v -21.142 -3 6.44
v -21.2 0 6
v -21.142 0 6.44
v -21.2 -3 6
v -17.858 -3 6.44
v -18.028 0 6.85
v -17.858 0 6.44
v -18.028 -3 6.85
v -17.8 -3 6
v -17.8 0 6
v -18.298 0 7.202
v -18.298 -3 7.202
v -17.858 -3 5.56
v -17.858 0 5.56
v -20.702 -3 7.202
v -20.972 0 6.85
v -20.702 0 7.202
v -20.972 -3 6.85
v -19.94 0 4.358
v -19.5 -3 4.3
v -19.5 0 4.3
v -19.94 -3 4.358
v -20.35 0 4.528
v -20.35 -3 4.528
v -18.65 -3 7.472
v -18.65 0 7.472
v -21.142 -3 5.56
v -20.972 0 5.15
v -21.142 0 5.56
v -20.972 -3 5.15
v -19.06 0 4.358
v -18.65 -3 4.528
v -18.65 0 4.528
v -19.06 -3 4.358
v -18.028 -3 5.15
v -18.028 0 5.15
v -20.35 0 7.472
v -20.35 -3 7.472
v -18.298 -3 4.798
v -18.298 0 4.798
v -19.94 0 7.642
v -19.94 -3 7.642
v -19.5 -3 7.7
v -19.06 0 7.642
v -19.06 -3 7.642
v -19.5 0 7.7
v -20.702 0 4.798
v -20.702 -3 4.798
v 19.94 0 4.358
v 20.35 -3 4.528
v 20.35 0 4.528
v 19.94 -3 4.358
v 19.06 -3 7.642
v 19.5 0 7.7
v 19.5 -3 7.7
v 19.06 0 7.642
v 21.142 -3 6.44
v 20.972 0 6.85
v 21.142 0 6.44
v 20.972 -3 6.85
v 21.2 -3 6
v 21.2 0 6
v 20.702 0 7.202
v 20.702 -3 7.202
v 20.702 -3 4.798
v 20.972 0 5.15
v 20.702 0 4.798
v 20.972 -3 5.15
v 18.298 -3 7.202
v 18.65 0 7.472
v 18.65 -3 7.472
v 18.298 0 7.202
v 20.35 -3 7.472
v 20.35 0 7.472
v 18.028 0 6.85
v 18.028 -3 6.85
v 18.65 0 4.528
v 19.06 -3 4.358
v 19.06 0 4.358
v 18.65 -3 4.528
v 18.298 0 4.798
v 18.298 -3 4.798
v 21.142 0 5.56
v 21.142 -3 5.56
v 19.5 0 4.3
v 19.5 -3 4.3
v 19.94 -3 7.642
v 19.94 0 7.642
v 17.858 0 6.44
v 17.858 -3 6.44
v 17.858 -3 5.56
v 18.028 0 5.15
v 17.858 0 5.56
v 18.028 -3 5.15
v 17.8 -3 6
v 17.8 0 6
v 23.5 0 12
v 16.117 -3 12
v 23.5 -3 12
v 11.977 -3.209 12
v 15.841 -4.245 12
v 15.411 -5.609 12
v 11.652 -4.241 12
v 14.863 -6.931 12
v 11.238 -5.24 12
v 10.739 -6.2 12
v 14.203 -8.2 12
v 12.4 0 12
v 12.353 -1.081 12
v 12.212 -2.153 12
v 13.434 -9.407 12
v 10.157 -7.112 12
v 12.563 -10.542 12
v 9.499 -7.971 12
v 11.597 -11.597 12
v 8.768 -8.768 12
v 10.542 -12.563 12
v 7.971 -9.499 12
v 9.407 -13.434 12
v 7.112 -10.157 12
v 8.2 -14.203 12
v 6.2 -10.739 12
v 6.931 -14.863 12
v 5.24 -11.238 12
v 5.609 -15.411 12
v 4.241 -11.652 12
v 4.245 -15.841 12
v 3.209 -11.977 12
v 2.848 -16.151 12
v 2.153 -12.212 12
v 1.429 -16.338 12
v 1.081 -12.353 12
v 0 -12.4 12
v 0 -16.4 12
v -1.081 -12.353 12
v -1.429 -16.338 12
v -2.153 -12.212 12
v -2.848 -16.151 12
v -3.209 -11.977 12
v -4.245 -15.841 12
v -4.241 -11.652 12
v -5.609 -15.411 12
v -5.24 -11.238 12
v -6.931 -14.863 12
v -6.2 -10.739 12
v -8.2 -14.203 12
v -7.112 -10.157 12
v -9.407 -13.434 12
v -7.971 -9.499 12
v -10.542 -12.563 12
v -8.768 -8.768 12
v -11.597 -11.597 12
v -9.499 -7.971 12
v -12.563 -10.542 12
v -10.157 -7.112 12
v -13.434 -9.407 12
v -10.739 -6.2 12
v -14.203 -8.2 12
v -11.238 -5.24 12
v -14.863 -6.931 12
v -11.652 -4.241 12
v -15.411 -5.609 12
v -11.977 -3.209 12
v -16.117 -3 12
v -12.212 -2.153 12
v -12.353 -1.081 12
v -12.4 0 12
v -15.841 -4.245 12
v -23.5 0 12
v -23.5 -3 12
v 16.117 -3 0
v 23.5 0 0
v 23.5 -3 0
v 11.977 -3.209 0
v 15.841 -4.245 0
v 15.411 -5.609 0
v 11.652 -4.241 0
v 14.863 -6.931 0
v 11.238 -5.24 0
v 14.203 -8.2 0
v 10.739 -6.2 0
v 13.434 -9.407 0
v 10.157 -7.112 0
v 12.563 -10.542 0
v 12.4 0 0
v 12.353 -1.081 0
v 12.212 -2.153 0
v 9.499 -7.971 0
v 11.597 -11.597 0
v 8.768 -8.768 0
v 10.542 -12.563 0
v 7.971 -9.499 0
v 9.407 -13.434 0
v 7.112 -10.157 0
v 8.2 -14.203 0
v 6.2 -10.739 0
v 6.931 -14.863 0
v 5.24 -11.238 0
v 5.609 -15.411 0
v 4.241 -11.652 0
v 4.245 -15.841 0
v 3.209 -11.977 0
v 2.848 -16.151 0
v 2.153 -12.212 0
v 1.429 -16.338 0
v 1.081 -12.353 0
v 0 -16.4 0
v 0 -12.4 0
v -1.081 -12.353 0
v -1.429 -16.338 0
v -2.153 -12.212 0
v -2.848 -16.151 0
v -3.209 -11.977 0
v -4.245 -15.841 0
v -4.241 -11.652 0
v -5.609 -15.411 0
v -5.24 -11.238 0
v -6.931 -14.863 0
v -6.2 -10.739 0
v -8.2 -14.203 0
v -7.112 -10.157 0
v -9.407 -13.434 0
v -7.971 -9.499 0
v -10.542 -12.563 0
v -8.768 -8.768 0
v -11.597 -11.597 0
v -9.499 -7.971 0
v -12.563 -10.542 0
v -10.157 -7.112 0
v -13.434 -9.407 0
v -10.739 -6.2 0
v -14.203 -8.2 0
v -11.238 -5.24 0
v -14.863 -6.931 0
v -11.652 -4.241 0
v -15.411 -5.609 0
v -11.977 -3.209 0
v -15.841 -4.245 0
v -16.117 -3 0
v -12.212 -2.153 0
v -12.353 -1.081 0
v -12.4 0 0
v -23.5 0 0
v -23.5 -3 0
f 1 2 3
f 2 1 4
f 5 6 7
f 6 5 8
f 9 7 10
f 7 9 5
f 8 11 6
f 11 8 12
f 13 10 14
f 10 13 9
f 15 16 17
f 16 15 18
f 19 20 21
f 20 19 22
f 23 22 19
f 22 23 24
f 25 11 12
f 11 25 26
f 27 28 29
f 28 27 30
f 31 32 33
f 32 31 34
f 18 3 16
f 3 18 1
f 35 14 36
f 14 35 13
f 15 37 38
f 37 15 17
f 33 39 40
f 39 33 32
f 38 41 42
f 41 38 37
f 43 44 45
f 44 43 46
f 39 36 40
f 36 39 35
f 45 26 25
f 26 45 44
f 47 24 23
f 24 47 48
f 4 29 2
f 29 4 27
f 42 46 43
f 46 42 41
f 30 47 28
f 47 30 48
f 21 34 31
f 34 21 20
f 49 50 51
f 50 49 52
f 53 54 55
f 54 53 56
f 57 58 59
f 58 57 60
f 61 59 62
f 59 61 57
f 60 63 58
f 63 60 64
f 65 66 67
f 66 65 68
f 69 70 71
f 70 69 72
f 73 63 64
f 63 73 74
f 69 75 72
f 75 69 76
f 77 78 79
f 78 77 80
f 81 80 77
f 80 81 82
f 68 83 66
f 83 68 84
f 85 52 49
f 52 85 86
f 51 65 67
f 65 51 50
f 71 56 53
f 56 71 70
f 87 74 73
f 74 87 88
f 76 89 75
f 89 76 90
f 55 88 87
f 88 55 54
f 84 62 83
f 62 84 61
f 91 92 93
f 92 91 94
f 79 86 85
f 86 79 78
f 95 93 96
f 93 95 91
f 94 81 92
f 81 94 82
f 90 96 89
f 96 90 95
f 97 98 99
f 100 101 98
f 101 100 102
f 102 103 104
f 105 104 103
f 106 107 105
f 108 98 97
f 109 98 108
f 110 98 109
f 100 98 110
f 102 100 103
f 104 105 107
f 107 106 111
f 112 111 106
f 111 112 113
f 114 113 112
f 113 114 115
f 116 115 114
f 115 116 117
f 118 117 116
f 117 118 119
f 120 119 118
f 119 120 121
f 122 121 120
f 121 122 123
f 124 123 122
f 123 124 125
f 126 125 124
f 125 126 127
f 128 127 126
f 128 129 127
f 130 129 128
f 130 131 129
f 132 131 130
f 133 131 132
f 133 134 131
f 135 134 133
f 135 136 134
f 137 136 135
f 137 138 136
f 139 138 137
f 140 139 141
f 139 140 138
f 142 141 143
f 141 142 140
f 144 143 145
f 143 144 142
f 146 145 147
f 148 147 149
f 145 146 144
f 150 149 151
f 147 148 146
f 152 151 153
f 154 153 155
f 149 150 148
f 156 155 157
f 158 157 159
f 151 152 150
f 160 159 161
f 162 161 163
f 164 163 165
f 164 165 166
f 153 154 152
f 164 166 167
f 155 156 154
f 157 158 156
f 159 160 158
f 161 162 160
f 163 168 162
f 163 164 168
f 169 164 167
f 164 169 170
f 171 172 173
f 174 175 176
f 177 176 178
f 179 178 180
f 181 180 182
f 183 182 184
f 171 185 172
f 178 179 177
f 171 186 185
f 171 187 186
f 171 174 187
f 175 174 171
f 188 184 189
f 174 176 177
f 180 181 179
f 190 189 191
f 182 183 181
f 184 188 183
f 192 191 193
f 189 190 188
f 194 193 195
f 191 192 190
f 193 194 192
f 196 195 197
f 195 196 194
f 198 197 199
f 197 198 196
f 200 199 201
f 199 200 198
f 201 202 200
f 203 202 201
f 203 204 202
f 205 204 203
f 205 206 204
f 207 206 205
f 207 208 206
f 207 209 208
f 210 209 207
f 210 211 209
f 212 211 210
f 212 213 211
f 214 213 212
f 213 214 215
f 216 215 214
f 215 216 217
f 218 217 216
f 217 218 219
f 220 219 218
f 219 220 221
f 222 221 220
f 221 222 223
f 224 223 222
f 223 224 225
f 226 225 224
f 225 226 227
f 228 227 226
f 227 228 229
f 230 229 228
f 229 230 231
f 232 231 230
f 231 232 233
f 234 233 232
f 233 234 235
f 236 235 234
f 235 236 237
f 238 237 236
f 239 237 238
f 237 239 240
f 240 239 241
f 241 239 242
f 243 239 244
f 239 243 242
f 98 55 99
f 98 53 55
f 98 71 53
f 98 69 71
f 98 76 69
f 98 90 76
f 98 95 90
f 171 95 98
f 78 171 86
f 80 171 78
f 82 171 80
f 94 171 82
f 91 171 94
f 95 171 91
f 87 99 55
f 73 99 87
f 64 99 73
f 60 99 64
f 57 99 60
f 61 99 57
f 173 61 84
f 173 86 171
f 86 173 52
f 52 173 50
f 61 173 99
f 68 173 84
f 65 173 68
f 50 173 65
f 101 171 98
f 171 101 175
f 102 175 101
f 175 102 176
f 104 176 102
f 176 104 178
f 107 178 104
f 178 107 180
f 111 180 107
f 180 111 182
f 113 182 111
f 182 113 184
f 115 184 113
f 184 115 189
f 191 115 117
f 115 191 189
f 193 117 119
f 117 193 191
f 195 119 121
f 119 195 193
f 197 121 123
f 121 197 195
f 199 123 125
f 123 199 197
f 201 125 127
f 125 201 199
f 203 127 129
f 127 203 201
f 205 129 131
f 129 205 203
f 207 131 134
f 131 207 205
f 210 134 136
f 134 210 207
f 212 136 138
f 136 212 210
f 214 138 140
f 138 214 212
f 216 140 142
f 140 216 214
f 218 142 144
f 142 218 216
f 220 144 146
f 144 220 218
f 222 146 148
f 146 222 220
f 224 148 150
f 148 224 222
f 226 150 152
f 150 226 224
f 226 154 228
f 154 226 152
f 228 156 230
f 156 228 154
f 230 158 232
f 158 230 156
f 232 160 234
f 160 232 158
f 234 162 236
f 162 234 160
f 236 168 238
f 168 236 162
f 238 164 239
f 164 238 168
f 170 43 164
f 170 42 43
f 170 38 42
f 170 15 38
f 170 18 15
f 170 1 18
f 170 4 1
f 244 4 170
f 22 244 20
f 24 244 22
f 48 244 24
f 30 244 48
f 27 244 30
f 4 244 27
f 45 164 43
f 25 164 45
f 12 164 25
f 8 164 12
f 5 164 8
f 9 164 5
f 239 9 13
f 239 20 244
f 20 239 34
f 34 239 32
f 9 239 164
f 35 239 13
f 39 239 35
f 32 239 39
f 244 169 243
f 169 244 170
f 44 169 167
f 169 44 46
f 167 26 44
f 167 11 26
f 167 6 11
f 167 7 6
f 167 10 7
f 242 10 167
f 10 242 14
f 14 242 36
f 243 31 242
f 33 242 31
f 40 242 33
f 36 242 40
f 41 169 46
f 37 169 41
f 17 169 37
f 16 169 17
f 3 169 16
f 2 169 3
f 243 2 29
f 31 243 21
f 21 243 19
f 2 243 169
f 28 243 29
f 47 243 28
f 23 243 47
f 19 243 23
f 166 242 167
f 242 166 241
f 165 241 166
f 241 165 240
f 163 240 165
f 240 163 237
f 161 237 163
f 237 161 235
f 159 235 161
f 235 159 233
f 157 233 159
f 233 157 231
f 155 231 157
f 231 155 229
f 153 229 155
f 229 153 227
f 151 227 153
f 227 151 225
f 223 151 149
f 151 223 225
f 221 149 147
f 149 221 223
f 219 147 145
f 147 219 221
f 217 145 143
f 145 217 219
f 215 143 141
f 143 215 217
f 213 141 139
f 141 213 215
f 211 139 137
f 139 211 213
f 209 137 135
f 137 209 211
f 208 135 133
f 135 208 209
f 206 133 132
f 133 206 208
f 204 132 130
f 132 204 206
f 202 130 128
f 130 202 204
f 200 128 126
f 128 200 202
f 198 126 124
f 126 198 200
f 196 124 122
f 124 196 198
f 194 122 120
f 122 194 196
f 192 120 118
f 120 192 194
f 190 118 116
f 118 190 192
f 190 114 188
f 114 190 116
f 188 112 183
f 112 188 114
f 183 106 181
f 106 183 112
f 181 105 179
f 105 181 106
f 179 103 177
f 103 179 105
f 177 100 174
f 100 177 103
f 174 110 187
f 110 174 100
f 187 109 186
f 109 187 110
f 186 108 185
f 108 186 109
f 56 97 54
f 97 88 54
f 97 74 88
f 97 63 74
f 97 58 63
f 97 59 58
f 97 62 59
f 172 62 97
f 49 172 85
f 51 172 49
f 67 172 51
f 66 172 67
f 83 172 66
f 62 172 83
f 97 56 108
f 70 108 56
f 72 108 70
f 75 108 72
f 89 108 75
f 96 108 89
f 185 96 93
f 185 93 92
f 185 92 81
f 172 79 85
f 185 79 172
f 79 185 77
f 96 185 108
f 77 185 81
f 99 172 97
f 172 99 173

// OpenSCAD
// =====================================================================
//  robot base :: motor strap (print 4: 2 per motor; part of the motor bracket set)
//  Half-ring clamp over the JGA25 can, 12 wide, ears with 2x M3x10 down into the
//  bracket's top inserts. Tighten snug (the can is 24.4 d; strap bore 24.8).
//  Print orientation: standing on a side face (profile extruded along the print
//  height): no overhang, horizontal screw holes.
//  robot_motor_strap(side, i)  side +1/-1, i = 0 (inner) / 1 (outer), robot frame.
// =====================================================================
include <../lib/params.scad>
include <../lib/robot_params.scad>

rbms_w = 12;  rbms_ri = 12.4;  rbms_ro = 16.4;  rbms_ear = 3;  rbms_hw = 23.5;  rbms_ex = 19.5;
rbms_y = [70, 86];   // = rbmb_strap_y in robot_motor_bracket.scad

// local frame: x across, y 0 .. 12 along the motor axis, z up from the axis plane
module rbms_local() {
    difference() {
        rotate([90, 0, 0]) translate([0, 0, -rbms_w]) linear_extrude(rbms_w) rbms_profile_clean();
        for (s = [-1, 1]) translate([s * rbms_ex, rbms_w / 2, -1]) cylinder(h = rbms_ear + 2, d = m3_clear, $fn = 24);
    }
}

module rbms_profile_clean() {
    difference() {
        union() {
            intersection() {
                circle(r = rbms_ro, $fn = 72);
                translate([-rbms_ro, 0]) square([2 * rbms_ro, rbms_ro]);
            }
            translate([-rbms_hw, 0]) square([2 * rbms_hw, rbms_ear]);
        }
        circle(r = rbms_ri, $fn = 72);
    }
}

module robot_motor_strap(side = 1, i = 0) {
    translate([rb_axle_x, 0, rb_axle_z]) mirror([0, side < 0 ? 1 : 0, 0])
        translate([0, rbms_y[i] - rbms_w / 2, 0]) rbms_local();
}

module robot_motor_strap_print() { rotate([90, 0, 0]) rbms_local(); }

robot_motor_strap_print();
